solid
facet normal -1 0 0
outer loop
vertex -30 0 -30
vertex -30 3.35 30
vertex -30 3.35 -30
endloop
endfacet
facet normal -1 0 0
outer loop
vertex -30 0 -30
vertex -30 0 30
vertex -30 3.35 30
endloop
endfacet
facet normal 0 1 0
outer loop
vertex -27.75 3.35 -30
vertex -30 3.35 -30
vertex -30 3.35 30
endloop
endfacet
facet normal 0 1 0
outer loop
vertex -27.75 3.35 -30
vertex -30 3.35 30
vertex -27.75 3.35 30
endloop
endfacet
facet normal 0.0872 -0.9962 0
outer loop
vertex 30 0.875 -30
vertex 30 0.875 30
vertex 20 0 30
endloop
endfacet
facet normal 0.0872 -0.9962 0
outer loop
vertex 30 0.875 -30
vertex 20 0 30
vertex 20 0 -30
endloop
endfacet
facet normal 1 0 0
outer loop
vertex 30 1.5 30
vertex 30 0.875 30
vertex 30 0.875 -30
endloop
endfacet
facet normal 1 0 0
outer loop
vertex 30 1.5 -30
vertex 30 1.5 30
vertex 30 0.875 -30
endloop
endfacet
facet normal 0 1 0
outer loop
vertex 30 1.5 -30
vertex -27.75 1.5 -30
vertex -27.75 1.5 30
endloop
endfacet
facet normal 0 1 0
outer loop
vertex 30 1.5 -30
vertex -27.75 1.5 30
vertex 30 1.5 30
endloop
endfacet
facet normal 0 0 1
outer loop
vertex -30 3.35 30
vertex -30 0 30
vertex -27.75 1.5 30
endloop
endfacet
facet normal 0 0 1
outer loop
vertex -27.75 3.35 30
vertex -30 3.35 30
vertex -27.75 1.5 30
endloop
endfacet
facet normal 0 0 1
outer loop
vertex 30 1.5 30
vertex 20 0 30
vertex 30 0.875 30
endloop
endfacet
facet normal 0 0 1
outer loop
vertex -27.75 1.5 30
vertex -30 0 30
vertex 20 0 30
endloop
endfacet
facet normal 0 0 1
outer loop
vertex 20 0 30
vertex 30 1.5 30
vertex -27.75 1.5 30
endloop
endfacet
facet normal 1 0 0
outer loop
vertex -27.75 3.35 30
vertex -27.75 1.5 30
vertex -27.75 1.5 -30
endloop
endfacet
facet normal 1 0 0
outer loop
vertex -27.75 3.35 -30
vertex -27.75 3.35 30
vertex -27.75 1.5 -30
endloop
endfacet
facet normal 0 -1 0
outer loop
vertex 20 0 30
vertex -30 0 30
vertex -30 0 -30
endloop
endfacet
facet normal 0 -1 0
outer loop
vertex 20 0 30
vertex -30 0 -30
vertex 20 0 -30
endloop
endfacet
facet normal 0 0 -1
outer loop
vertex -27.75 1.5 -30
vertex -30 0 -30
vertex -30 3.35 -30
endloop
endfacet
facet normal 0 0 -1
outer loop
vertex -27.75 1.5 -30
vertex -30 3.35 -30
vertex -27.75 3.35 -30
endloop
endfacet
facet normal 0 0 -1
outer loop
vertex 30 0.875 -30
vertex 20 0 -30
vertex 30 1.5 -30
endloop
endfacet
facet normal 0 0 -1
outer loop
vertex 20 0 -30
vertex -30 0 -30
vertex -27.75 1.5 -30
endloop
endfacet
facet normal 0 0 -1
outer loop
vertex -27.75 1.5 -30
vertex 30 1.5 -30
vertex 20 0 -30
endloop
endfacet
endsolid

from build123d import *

# Parameters (mm, degrees)
SKETCH1_W           = 60
SKETCH1_H           = 60
BOSS_EXTRUDE1_DEPTH = 1.5
SKETCH4_W           = 2.25
SKETCH4_H           = 60
BOSS_EXTRUDE2_DEPTH = 1.85
CHAMFER1_SIZE       = 10
CHAMFER1_SIZE2      = 0.874886635


with BuildPart() as part:
    # Sketch1 → Boss-Extrude1 (new body)
    with BuildSketch(Plane(origin=(0, 0, 0), x_dir=(1, 0, 0), z_dir=(0, 1, 0))):
        Rectangle(SKETCH1_W, SKETCH1_H)
    extrude(amount=BOSS_EXTRUDE1_DEPTH)

    # Sketch4 → Boss-Extrude2 (add)
    with BuildSketch(Plane(origin=(0, 1.5, 0), x_dir=(1, 0, 0), z_dir=(0, 1, 0))):
        with Locations((-28.875, 0)):
            Rectangle(SKETCH4_W, SKETCH4_H)
    extrude(amount=BOSS_EXTRUDE2_DEPTH)

    # Chamfer1
    chamfer1_edges = [part.edges().sort_by_distance(p)[0] for p in [
        (30, 0, 0),
    ]]
    chamfer1_side = [part.faces().sort_by_distance(p)[0] for p in [
        (0, 0, 0),
    ]]
    chamfer(chamfer1_edges, length=CHAMFER1_SIZE, length2=CHAMFER1_SIZE2, reference=chamfer1_side[0])


solid = part.part
